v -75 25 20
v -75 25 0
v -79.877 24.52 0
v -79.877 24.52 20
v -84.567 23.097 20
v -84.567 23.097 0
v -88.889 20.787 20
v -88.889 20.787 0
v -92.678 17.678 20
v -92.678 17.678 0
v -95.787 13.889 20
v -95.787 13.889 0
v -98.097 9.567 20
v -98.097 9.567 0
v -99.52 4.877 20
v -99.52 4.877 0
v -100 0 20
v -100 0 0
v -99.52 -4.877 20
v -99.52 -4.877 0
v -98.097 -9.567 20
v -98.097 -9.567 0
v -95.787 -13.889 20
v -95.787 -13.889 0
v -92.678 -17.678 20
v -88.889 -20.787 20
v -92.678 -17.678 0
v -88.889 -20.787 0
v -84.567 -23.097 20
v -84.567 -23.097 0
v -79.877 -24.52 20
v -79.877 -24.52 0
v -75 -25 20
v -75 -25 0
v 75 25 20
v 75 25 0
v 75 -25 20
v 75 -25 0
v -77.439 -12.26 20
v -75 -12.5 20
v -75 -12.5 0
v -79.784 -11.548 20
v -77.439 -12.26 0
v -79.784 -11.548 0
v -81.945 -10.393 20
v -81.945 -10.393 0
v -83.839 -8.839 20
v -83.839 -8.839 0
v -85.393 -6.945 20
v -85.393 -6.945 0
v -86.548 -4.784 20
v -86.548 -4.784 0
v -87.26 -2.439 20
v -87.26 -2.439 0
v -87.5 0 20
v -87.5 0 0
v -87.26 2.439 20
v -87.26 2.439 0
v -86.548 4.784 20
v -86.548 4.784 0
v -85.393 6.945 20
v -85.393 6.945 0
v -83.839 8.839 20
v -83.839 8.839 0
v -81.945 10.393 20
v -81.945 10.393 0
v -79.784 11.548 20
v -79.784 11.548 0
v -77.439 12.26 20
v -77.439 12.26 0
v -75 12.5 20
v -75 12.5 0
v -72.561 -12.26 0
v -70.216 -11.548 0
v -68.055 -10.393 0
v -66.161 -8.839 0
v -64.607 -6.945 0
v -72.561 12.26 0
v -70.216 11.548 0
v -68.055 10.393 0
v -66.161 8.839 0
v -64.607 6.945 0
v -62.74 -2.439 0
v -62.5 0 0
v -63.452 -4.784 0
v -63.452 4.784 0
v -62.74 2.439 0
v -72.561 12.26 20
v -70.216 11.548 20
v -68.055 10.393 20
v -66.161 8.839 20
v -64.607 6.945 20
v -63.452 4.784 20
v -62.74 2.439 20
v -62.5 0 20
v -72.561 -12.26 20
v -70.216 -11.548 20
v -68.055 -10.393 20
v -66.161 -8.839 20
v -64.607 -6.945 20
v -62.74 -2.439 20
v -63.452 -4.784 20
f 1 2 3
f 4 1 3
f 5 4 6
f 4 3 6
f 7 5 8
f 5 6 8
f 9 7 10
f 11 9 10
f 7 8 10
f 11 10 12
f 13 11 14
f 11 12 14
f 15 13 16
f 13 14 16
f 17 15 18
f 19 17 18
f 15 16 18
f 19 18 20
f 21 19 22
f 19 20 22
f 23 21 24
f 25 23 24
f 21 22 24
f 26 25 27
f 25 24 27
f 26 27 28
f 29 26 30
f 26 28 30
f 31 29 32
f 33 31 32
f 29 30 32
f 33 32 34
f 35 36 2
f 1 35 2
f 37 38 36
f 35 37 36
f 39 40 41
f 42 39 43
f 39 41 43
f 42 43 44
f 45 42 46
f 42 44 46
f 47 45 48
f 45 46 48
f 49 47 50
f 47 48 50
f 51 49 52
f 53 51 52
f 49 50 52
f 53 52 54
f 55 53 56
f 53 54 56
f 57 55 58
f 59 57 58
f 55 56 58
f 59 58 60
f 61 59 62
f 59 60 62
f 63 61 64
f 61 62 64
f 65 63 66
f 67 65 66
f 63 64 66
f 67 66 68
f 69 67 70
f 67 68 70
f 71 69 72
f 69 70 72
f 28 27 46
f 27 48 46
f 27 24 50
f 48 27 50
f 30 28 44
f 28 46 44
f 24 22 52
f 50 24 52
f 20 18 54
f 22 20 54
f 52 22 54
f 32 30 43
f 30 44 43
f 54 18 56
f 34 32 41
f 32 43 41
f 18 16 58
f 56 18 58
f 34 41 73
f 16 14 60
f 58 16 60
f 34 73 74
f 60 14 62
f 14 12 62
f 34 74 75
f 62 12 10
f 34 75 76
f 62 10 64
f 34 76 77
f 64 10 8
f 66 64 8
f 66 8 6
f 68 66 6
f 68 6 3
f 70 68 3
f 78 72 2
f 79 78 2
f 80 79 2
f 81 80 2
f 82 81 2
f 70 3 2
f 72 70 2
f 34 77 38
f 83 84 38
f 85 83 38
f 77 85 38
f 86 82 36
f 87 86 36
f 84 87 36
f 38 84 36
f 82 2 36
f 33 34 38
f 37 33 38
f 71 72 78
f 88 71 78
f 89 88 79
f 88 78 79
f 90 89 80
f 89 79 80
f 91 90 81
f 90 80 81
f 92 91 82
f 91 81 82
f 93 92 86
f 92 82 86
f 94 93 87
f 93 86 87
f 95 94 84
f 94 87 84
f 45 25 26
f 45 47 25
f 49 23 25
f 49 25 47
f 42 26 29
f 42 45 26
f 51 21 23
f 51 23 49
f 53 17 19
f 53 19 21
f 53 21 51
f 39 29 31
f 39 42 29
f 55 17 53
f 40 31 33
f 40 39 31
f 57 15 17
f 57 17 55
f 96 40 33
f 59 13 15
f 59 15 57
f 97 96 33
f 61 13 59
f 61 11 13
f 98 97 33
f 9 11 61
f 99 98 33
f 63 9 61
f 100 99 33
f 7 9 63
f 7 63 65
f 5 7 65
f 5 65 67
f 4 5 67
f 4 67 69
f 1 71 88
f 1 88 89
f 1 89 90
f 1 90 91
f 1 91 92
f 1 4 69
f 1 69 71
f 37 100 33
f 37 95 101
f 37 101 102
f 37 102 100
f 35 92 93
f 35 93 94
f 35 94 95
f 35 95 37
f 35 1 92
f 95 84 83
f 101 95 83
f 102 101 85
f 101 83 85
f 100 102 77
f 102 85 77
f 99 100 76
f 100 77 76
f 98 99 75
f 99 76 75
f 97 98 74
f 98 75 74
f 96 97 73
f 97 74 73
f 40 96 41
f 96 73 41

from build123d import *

# Parameters (mm, degrees)
F1_DEPTH = 20


with BuildPart() as f1:
    # F0 (on Top) → F1 (new body)
    with BuildSketch(Plane.XY):
        with BuildLine():
            ThreePointArc((-50, 0), (-57.3223304703, 17.6776695297), (-75, 25))
            Line((-75, 25), (-75, 12.5))
            ThreePointArc((-75, 12.5), (-66.1611652352, 8.8388347648), (-62.5, 0))
            ThreePointArc((-62.5, 0), (-66.1611652352, -8.8388347648), (-75, -12.5))
            Line((-75, -12.5), (-75, -25))
            ThreePointArc((-75, -25), (-57.3223304703, -17.6776695297), (-50, 0))
        make_face()
        with BuildLine():
            Line((75, 25), (-75, 25))
            ThreePointArc((-75, 25), (-57.3223304703, 17.6776695297), (-50, 0))
            ThreePointArc((-50, 0), (-57.3223304703, -17.6776695297), (-75, -25))
            Line((-75, -25), (75, -25))
            Line((75, -25), (75, 25))
        make_face()
        with BuildLine():
            Line((-75, 12.5), (-75, 25))
            ThreePointArc((-75, 25), (-100, 0), (-75, -25))
            Line((-75, -25), (-75, -12.5))
            ThreePointArc((-75, -12.5), (-87.5, 0), (-75, 12.5))
        make_face()
    extrude(amount=F1_DEPTH)


solid = f1.part
